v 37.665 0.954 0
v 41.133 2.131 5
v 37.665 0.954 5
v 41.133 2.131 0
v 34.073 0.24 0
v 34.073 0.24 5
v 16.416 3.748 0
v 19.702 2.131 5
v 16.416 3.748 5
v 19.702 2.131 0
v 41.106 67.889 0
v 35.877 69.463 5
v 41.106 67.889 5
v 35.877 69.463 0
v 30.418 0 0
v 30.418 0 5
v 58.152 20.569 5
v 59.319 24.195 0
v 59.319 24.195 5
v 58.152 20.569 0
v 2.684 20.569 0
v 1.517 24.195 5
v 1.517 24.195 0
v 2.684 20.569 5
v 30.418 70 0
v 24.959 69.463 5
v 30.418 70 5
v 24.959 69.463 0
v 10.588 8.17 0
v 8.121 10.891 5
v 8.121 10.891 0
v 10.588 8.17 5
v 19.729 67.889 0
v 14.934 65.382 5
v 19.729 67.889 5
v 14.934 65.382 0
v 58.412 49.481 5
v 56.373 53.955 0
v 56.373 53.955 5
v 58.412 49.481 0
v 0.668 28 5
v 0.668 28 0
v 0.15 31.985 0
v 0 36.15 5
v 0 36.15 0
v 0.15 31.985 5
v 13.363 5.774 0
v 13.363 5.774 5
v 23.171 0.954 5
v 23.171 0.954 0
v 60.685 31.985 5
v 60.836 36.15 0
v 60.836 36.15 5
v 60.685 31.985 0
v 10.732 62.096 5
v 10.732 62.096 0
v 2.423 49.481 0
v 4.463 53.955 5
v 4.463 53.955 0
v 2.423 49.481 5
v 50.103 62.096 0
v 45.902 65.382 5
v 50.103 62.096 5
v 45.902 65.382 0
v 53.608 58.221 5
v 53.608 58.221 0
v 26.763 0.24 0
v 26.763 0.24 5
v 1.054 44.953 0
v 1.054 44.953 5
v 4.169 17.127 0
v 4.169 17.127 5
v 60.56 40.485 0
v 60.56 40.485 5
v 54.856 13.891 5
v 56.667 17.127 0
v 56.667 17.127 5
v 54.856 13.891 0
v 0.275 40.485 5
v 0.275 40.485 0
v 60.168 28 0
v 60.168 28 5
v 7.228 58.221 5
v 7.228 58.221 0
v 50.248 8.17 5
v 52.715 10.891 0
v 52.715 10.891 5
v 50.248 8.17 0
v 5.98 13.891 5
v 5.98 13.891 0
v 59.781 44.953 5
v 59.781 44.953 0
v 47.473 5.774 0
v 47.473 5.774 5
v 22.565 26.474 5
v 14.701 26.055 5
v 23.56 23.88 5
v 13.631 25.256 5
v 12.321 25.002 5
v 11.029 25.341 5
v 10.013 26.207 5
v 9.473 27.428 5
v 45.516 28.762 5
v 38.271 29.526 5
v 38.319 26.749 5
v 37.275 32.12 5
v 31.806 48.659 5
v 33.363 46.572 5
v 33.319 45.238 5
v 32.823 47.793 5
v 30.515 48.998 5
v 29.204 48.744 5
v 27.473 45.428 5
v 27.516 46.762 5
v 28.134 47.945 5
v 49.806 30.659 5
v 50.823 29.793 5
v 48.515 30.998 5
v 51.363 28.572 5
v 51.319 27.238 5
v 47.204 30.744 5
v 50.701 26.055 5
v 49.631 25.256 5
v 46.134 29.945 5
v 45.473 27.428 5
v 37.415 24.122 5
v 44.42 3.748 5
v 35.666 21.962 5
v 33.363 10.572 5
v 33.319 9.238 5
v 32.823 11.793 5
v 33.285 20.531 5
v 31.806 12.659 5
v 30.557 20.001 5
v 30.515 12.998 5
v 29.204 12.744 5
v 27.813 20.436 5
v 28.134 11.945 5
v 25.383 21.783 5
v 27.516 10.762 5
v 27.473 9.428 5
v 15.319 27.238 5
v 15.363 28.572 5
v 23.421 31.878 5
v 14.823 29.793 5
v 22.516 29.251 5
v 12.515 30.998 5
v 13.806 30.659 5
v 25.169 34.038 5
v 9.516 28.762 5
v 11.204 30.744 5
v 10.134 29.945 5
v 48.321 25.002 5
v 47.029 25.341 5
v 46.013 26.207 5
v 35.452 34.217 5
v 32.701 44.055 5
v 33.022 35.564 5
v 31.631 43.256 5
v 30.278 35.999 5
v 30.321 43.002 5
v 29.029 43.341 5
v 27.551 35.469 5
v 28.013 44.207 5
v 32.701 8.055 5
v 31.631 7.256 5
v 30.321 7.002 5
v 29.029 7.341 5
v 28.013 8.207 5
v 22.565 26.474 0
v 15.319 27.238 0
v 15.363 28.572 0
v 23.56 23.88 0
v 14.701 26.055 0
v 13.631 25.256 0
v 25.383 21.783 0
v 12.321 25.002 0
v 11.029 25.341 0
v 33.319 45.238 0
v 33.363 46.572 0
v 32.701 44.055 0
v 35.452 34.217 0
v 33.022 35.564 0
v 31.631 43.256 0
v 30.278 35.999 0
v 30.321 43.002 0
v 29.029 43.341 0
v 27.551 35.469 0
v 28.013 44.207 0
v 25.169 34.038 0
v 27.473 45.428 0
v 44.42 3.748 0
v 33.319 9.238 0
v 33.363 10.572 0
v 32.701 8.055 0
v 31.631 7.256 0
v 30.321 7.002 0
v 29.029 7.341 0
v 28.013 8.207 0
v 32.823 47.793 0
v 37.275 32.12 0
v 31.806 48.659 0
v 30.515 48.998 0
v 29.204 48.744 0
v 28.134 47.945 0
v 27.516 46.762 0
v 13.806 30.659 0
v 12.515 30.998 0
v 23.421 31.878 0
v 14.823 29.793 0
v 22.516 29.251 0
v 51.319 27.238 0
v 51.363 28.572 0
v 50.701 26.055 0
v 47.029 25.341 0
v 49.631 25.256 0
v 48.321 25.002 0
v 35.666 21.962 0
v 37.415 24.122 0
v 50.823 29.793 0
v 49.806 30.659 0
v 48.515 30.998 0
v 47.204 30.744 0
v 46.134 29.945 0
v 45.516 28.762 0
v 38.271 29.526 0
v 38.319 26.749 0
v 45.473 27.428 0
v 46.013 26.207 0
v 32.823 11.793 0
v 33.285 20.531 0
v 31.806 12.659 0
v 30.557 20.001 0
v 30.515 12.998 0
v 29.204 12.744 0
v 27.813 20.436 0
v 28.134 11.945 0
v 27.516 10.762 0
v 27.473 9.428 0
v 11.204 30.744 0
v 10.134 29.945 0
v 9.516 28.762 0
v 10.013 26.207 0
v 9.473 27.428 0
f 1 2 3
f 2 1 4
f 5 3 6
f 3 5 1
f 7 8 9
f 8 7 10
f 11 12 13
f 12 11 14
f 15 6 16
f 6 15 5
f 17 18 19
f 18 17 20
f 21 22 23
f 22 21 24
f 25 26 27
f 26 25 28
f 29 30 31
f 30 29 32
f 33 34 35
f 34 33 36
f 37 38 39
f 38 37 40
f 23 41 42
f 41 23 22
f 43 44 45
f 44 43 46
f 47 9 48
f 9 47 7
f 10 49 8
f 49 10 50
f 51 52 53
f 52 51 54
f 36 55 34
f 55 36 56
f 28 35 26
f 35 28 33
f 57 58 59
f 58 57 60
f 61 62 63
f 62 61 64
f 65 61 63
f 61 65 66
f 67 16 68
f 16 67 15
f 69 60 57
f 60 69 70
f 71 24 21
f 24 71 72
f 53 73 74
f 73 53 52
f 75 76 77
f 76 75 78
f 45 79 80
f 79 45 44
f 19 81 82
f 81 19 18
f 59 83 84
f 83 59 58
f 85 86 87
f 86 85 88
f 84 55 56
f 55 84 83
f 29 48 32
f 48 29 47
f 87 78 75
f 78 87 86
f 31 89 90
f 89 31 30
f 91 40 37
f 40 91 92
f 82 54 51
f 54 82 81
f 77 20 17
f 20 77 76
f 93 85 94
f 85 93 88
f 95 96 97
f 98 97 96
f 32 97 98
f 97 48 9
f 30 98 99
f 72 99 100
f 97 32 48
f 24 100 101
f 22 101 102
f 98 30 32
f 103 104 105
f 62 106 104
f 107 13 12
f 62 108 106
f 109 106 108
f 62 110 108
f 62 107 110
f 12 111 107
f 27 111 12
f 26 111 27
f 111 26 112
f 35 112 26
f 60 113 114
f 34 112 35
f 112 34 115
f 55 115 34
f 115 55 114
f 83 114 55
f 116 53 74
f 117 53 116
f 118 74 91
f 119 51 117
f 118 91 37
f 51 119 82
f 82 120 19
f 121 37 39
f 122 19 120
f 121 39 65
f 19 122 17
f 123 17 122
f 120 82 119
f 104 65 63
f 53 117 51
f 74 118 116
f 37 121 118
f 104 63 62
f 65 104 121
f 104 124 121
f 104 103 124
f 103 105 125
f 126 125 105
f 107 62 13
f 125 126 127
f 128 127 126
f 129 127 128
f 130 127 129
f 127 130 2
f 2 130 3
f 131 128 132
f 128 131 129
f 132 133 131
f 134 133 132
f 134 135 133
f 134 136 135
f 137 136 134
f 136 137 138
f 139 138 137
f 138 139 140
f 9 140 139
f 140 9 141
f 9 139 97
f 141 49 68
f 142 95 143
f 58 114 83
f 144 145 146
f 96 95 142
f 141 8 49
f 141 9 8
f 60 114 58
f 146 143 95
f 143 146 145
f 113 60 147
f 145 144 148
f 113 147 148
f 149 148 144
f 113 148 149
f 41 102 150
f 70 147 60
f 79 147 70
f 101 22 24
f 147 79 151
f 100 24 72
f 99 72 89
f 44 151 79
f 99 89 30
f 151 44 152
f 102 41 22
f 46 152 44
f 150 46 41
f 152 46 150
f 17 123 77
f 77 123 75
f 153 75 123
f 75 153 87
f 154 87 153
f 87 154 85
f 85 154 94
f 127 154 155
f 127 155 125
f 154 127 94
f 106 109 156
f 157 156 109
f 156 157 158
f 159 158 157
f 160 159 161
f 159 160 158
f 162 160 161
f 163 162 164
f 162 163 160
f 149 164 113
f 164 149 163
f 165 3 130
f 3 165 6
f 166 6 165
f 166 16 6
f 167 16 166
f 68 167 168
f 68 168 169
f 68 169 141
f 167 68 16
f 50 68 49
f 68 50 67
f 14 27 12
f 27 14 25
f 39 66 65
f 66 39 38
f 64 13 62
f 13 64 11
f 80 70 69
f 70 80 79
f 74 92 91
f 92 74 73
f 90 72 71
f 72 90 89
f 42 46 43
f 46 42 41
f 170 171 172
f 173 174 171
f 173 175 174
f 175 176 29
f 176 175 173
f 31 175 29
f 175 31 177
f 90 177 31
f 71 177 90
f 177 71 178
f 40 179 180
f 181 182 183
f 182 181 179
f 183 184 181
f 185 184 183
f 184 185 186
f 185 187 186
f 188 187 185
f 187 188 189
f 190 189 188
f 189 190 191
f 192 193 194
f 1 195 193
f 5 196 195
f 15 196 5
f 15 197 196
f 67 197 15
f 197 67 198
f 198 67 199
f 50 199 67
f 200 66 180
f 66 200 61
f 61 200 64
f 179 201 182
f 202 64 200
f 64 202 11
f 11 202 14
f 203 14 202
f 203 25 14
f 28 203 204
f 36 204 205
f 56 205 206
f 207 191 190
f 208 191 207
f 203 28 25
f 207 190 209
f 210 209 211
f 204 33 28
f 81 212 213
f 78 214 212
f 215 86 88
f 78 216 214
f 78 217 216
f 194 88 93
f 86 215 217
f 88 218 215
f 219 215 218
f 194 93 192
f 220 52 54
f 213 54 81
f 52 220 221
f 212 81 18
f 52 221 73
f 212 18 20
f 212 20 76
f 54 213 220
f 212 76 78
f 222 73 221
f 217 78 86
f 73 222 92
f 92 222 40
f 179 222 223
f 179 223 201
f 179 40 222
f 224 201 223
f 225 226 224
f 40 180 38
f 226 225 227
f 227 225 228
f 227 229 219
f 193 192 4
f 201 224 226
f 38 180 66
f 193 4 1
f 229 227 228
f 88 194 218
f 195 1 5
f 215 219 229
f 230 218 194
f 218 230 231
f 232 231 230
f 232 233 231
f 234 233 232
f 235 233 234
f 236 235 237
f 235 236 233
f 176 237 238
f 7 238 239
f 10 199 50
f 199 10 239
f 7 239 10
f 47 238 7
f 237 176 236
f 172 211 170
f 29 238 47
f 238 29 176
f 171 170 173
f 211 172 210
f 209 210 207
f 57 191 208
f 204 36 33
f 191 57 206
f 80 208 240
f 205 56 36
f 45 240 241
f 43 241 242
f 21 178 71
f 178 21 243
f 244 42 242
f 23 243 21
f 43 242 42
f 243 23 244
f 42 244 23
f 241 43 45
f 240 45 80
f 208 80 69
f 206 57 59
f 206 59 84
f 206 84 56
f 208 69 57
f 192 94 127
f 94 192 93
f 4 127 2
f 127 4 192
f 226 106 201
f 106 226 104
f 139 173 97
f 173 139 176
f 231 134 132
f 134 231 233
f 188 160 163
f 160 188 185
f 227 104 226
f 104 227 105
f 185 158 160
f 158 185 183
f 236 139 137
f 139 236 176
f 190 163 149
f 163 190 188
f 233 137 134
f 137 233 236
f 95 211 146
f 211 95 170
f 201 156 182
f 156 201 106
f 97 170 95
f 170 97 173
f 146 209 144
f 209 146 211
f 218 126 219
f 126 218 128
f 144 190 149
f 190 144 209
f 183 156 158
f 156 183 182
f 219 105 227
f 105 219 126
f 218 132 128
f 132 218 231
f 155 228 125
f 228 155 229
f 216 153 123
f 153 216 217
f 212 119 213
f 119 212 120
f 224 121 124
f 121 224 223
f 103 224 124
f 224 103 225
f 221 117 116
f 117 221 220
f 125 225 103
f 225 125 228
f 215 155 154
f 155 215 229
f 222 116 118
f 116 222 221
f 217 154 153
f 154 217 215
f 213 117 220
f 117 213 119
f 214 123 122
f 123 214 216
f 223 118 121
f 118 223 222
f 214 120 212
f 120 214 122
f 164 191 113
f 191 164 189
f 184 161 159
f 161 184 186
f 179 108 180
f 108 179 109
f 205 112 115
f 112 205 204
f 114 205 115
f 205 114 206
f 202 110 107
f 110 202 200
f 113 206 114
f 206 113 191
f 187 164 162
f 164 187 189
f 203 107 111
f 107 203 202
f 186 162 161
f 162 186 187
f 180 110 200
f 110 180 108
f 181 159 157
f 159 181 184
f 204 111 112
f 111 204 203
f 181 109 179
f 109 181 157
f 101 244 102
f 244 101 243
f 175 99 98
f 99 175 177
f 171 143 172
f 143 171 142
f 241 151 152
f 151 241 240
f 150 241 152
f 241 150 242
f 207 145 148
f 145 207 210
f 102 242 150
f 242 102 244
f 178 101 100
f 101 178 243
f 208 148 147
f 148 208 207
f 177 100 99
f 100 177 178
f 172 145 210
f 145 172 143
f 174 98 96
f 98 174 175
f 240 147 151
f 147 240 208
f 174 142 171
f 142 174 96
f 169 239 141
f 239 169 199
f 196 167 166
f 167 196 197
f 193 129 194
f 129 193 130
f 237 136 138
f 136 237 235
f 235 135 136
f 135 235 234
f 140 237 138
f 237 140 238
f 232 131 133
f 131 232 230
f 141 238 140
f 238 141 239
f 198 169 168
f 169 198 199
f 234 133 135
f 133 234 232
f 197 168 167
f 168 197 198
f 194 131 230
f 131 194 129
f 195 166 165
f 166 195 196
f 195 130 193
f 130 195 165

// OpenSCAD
$fn = 32;

// ----------------------------------------------------------------------
// Cam plate: single_lobe cam, base R28
// ----------------------------------------------------------------------

// --- parameters (mm) ---
base_r = 28;              // base circle radius
lobe_h = 14;              // cam lobe rise
bore_r = 8;               // shaft bore radius
plate_t = 5;              // plate thickness, Z (extrusion height)
ring_r = 18;              // lightening ring radius
bolt_r = 3;               // lightening hole radius

profile = [[60.168, 28], [60.685, 31.985], [60.836, 36.15], [60.56, 40.485], [59.781, 44.953], [58.412, 49.481], [56.373, 53.955], [53.608, 58.221], [50.103, 62.096], [45.902, 65.382], [41.106, 67.889], [35.877, 69.463], [30.418, 70], [24.959, 69.463], [19.729, 67.889], [14.934, 65.382], [10.732, 62.096], [7.228, 58.221], [4.463, 53.955], [2.423, 49.481], [1.054, 44.953], [0.275, 40.485], [0, 36.15], [0.15, 31.985], [0.668, 28], [1.517, 24.195], [2.684, 20.569], [4.169, 17.127], [5.98, 13.891], [8.121, 10.891], [10.588, 8.17], [13.363, 5.774], [16.416, 3.748], [19.702, 2.131], [23.171, 0.954], [26.763, 0.24], [30.418, 0], [34.073, 0.24], [37.665, 0.954], [41.133, 2.131], [44.42, 3.748], [47.473, 5.774], [50.248, 8.17], [52.715, 10.891], [54.856, 13.891], [56.667, 17.127], [58.152, 20.569], [59.319, 24.195]];  // primary outline, 48 points, counter clockwise
void_1 = [[38.271, 29.526], [37.275, 32.12], [35.452, 34.217], [33.022, 35.564], [30.278, 35.999], [27.551, 35.469], [25.169, 34.038], [23.421, 31.878], [22.516, 29.251], [22.565, 26.474], [23.56, 23.88], [25.383, 21.783], [27.813, 20.436], [30.557, 20.001], [33.285, 20.531], [35.666, 21.962], [37.415, 24.122], [38.319, 26.749]];  // shaft bore, 18 points
void_2 = [[51.363, 28.572], [50.823, 29.793], [49.806, 30.659], [48.515, 30.998], [47.204, 30.744], [46.134, 29.945], [45.516, 28.762], [45.473, 27.428], [46.013, 26.207], [47.029, 25.341], [48.321, 25.002], [49.631, 25.256], [50.701, 26.055], [51.319, 27.238]];  // lightening hole 1, 14 points
void_3 = [[33.363, 46.572], [32.823, 47.793], [31.806, 48.659], [30.515, 48.998], [29.204, 48.744], [28.134, 47.945], [27.516, 46.762], [27.473, 45.428], [28.013, 44.207], [29.029, 43.341], [30.321, 43.002], [31.631, 43.256], [32.701, 44.055], [33.319, 45.238]];  // lightening hole 2, 14 points
void_4 = [[15.363, 28.572], [14.823, 29.793], [13.806, 30.659], [12.515, 30.998], [11.204, 30.744], [10.134, 29.945], [9.516, 28.762], [9.473, 27.428], [10.013, 26.207], [11.029, 25.341], [12.321, 25.002], [13.631, 25.256], [14.701, 26.055], [15.319, 27.238]];  // lightening hole 3, 14 points
void_5 = [[33.363, 10.572], [32.823, 11.793], [31.806, 12.659], [30.515, 12.998], [29.204, 12.744], [28.134, 11.945], [27.516, 10.762], [27.473, 9.428], [28.013, 8.207], [29.029, 7.341], [30.321, 7.002], [31.631, 7.256], [32.701, 8.055], [33.319, 9.238]];  // lightening hole 4, 14 points

// --- the one profile operation ---
difference() {
  linear_extrude(height = plate_t) polygon(points = profile);
  translate([0, 0, -1])
    linear_extrude(height = plate_t + 2) polygon(points = void_1);
  translate([0, 0, -1])
    linear_extrude(height = plate_t + 2) polygon(points = void_2);
  translate([0, 0, -1])
    linear_extrude(height = plate_t + 2) polygon(points = void_3);
  translate([0, 0, -1])
    linear_extrude(height = plate_t + 2) polygon(points = void_4);
  translate([0, 0, -1])
    linear_extrude(height = plate_t + 2) polygon(points = void_5);
}
